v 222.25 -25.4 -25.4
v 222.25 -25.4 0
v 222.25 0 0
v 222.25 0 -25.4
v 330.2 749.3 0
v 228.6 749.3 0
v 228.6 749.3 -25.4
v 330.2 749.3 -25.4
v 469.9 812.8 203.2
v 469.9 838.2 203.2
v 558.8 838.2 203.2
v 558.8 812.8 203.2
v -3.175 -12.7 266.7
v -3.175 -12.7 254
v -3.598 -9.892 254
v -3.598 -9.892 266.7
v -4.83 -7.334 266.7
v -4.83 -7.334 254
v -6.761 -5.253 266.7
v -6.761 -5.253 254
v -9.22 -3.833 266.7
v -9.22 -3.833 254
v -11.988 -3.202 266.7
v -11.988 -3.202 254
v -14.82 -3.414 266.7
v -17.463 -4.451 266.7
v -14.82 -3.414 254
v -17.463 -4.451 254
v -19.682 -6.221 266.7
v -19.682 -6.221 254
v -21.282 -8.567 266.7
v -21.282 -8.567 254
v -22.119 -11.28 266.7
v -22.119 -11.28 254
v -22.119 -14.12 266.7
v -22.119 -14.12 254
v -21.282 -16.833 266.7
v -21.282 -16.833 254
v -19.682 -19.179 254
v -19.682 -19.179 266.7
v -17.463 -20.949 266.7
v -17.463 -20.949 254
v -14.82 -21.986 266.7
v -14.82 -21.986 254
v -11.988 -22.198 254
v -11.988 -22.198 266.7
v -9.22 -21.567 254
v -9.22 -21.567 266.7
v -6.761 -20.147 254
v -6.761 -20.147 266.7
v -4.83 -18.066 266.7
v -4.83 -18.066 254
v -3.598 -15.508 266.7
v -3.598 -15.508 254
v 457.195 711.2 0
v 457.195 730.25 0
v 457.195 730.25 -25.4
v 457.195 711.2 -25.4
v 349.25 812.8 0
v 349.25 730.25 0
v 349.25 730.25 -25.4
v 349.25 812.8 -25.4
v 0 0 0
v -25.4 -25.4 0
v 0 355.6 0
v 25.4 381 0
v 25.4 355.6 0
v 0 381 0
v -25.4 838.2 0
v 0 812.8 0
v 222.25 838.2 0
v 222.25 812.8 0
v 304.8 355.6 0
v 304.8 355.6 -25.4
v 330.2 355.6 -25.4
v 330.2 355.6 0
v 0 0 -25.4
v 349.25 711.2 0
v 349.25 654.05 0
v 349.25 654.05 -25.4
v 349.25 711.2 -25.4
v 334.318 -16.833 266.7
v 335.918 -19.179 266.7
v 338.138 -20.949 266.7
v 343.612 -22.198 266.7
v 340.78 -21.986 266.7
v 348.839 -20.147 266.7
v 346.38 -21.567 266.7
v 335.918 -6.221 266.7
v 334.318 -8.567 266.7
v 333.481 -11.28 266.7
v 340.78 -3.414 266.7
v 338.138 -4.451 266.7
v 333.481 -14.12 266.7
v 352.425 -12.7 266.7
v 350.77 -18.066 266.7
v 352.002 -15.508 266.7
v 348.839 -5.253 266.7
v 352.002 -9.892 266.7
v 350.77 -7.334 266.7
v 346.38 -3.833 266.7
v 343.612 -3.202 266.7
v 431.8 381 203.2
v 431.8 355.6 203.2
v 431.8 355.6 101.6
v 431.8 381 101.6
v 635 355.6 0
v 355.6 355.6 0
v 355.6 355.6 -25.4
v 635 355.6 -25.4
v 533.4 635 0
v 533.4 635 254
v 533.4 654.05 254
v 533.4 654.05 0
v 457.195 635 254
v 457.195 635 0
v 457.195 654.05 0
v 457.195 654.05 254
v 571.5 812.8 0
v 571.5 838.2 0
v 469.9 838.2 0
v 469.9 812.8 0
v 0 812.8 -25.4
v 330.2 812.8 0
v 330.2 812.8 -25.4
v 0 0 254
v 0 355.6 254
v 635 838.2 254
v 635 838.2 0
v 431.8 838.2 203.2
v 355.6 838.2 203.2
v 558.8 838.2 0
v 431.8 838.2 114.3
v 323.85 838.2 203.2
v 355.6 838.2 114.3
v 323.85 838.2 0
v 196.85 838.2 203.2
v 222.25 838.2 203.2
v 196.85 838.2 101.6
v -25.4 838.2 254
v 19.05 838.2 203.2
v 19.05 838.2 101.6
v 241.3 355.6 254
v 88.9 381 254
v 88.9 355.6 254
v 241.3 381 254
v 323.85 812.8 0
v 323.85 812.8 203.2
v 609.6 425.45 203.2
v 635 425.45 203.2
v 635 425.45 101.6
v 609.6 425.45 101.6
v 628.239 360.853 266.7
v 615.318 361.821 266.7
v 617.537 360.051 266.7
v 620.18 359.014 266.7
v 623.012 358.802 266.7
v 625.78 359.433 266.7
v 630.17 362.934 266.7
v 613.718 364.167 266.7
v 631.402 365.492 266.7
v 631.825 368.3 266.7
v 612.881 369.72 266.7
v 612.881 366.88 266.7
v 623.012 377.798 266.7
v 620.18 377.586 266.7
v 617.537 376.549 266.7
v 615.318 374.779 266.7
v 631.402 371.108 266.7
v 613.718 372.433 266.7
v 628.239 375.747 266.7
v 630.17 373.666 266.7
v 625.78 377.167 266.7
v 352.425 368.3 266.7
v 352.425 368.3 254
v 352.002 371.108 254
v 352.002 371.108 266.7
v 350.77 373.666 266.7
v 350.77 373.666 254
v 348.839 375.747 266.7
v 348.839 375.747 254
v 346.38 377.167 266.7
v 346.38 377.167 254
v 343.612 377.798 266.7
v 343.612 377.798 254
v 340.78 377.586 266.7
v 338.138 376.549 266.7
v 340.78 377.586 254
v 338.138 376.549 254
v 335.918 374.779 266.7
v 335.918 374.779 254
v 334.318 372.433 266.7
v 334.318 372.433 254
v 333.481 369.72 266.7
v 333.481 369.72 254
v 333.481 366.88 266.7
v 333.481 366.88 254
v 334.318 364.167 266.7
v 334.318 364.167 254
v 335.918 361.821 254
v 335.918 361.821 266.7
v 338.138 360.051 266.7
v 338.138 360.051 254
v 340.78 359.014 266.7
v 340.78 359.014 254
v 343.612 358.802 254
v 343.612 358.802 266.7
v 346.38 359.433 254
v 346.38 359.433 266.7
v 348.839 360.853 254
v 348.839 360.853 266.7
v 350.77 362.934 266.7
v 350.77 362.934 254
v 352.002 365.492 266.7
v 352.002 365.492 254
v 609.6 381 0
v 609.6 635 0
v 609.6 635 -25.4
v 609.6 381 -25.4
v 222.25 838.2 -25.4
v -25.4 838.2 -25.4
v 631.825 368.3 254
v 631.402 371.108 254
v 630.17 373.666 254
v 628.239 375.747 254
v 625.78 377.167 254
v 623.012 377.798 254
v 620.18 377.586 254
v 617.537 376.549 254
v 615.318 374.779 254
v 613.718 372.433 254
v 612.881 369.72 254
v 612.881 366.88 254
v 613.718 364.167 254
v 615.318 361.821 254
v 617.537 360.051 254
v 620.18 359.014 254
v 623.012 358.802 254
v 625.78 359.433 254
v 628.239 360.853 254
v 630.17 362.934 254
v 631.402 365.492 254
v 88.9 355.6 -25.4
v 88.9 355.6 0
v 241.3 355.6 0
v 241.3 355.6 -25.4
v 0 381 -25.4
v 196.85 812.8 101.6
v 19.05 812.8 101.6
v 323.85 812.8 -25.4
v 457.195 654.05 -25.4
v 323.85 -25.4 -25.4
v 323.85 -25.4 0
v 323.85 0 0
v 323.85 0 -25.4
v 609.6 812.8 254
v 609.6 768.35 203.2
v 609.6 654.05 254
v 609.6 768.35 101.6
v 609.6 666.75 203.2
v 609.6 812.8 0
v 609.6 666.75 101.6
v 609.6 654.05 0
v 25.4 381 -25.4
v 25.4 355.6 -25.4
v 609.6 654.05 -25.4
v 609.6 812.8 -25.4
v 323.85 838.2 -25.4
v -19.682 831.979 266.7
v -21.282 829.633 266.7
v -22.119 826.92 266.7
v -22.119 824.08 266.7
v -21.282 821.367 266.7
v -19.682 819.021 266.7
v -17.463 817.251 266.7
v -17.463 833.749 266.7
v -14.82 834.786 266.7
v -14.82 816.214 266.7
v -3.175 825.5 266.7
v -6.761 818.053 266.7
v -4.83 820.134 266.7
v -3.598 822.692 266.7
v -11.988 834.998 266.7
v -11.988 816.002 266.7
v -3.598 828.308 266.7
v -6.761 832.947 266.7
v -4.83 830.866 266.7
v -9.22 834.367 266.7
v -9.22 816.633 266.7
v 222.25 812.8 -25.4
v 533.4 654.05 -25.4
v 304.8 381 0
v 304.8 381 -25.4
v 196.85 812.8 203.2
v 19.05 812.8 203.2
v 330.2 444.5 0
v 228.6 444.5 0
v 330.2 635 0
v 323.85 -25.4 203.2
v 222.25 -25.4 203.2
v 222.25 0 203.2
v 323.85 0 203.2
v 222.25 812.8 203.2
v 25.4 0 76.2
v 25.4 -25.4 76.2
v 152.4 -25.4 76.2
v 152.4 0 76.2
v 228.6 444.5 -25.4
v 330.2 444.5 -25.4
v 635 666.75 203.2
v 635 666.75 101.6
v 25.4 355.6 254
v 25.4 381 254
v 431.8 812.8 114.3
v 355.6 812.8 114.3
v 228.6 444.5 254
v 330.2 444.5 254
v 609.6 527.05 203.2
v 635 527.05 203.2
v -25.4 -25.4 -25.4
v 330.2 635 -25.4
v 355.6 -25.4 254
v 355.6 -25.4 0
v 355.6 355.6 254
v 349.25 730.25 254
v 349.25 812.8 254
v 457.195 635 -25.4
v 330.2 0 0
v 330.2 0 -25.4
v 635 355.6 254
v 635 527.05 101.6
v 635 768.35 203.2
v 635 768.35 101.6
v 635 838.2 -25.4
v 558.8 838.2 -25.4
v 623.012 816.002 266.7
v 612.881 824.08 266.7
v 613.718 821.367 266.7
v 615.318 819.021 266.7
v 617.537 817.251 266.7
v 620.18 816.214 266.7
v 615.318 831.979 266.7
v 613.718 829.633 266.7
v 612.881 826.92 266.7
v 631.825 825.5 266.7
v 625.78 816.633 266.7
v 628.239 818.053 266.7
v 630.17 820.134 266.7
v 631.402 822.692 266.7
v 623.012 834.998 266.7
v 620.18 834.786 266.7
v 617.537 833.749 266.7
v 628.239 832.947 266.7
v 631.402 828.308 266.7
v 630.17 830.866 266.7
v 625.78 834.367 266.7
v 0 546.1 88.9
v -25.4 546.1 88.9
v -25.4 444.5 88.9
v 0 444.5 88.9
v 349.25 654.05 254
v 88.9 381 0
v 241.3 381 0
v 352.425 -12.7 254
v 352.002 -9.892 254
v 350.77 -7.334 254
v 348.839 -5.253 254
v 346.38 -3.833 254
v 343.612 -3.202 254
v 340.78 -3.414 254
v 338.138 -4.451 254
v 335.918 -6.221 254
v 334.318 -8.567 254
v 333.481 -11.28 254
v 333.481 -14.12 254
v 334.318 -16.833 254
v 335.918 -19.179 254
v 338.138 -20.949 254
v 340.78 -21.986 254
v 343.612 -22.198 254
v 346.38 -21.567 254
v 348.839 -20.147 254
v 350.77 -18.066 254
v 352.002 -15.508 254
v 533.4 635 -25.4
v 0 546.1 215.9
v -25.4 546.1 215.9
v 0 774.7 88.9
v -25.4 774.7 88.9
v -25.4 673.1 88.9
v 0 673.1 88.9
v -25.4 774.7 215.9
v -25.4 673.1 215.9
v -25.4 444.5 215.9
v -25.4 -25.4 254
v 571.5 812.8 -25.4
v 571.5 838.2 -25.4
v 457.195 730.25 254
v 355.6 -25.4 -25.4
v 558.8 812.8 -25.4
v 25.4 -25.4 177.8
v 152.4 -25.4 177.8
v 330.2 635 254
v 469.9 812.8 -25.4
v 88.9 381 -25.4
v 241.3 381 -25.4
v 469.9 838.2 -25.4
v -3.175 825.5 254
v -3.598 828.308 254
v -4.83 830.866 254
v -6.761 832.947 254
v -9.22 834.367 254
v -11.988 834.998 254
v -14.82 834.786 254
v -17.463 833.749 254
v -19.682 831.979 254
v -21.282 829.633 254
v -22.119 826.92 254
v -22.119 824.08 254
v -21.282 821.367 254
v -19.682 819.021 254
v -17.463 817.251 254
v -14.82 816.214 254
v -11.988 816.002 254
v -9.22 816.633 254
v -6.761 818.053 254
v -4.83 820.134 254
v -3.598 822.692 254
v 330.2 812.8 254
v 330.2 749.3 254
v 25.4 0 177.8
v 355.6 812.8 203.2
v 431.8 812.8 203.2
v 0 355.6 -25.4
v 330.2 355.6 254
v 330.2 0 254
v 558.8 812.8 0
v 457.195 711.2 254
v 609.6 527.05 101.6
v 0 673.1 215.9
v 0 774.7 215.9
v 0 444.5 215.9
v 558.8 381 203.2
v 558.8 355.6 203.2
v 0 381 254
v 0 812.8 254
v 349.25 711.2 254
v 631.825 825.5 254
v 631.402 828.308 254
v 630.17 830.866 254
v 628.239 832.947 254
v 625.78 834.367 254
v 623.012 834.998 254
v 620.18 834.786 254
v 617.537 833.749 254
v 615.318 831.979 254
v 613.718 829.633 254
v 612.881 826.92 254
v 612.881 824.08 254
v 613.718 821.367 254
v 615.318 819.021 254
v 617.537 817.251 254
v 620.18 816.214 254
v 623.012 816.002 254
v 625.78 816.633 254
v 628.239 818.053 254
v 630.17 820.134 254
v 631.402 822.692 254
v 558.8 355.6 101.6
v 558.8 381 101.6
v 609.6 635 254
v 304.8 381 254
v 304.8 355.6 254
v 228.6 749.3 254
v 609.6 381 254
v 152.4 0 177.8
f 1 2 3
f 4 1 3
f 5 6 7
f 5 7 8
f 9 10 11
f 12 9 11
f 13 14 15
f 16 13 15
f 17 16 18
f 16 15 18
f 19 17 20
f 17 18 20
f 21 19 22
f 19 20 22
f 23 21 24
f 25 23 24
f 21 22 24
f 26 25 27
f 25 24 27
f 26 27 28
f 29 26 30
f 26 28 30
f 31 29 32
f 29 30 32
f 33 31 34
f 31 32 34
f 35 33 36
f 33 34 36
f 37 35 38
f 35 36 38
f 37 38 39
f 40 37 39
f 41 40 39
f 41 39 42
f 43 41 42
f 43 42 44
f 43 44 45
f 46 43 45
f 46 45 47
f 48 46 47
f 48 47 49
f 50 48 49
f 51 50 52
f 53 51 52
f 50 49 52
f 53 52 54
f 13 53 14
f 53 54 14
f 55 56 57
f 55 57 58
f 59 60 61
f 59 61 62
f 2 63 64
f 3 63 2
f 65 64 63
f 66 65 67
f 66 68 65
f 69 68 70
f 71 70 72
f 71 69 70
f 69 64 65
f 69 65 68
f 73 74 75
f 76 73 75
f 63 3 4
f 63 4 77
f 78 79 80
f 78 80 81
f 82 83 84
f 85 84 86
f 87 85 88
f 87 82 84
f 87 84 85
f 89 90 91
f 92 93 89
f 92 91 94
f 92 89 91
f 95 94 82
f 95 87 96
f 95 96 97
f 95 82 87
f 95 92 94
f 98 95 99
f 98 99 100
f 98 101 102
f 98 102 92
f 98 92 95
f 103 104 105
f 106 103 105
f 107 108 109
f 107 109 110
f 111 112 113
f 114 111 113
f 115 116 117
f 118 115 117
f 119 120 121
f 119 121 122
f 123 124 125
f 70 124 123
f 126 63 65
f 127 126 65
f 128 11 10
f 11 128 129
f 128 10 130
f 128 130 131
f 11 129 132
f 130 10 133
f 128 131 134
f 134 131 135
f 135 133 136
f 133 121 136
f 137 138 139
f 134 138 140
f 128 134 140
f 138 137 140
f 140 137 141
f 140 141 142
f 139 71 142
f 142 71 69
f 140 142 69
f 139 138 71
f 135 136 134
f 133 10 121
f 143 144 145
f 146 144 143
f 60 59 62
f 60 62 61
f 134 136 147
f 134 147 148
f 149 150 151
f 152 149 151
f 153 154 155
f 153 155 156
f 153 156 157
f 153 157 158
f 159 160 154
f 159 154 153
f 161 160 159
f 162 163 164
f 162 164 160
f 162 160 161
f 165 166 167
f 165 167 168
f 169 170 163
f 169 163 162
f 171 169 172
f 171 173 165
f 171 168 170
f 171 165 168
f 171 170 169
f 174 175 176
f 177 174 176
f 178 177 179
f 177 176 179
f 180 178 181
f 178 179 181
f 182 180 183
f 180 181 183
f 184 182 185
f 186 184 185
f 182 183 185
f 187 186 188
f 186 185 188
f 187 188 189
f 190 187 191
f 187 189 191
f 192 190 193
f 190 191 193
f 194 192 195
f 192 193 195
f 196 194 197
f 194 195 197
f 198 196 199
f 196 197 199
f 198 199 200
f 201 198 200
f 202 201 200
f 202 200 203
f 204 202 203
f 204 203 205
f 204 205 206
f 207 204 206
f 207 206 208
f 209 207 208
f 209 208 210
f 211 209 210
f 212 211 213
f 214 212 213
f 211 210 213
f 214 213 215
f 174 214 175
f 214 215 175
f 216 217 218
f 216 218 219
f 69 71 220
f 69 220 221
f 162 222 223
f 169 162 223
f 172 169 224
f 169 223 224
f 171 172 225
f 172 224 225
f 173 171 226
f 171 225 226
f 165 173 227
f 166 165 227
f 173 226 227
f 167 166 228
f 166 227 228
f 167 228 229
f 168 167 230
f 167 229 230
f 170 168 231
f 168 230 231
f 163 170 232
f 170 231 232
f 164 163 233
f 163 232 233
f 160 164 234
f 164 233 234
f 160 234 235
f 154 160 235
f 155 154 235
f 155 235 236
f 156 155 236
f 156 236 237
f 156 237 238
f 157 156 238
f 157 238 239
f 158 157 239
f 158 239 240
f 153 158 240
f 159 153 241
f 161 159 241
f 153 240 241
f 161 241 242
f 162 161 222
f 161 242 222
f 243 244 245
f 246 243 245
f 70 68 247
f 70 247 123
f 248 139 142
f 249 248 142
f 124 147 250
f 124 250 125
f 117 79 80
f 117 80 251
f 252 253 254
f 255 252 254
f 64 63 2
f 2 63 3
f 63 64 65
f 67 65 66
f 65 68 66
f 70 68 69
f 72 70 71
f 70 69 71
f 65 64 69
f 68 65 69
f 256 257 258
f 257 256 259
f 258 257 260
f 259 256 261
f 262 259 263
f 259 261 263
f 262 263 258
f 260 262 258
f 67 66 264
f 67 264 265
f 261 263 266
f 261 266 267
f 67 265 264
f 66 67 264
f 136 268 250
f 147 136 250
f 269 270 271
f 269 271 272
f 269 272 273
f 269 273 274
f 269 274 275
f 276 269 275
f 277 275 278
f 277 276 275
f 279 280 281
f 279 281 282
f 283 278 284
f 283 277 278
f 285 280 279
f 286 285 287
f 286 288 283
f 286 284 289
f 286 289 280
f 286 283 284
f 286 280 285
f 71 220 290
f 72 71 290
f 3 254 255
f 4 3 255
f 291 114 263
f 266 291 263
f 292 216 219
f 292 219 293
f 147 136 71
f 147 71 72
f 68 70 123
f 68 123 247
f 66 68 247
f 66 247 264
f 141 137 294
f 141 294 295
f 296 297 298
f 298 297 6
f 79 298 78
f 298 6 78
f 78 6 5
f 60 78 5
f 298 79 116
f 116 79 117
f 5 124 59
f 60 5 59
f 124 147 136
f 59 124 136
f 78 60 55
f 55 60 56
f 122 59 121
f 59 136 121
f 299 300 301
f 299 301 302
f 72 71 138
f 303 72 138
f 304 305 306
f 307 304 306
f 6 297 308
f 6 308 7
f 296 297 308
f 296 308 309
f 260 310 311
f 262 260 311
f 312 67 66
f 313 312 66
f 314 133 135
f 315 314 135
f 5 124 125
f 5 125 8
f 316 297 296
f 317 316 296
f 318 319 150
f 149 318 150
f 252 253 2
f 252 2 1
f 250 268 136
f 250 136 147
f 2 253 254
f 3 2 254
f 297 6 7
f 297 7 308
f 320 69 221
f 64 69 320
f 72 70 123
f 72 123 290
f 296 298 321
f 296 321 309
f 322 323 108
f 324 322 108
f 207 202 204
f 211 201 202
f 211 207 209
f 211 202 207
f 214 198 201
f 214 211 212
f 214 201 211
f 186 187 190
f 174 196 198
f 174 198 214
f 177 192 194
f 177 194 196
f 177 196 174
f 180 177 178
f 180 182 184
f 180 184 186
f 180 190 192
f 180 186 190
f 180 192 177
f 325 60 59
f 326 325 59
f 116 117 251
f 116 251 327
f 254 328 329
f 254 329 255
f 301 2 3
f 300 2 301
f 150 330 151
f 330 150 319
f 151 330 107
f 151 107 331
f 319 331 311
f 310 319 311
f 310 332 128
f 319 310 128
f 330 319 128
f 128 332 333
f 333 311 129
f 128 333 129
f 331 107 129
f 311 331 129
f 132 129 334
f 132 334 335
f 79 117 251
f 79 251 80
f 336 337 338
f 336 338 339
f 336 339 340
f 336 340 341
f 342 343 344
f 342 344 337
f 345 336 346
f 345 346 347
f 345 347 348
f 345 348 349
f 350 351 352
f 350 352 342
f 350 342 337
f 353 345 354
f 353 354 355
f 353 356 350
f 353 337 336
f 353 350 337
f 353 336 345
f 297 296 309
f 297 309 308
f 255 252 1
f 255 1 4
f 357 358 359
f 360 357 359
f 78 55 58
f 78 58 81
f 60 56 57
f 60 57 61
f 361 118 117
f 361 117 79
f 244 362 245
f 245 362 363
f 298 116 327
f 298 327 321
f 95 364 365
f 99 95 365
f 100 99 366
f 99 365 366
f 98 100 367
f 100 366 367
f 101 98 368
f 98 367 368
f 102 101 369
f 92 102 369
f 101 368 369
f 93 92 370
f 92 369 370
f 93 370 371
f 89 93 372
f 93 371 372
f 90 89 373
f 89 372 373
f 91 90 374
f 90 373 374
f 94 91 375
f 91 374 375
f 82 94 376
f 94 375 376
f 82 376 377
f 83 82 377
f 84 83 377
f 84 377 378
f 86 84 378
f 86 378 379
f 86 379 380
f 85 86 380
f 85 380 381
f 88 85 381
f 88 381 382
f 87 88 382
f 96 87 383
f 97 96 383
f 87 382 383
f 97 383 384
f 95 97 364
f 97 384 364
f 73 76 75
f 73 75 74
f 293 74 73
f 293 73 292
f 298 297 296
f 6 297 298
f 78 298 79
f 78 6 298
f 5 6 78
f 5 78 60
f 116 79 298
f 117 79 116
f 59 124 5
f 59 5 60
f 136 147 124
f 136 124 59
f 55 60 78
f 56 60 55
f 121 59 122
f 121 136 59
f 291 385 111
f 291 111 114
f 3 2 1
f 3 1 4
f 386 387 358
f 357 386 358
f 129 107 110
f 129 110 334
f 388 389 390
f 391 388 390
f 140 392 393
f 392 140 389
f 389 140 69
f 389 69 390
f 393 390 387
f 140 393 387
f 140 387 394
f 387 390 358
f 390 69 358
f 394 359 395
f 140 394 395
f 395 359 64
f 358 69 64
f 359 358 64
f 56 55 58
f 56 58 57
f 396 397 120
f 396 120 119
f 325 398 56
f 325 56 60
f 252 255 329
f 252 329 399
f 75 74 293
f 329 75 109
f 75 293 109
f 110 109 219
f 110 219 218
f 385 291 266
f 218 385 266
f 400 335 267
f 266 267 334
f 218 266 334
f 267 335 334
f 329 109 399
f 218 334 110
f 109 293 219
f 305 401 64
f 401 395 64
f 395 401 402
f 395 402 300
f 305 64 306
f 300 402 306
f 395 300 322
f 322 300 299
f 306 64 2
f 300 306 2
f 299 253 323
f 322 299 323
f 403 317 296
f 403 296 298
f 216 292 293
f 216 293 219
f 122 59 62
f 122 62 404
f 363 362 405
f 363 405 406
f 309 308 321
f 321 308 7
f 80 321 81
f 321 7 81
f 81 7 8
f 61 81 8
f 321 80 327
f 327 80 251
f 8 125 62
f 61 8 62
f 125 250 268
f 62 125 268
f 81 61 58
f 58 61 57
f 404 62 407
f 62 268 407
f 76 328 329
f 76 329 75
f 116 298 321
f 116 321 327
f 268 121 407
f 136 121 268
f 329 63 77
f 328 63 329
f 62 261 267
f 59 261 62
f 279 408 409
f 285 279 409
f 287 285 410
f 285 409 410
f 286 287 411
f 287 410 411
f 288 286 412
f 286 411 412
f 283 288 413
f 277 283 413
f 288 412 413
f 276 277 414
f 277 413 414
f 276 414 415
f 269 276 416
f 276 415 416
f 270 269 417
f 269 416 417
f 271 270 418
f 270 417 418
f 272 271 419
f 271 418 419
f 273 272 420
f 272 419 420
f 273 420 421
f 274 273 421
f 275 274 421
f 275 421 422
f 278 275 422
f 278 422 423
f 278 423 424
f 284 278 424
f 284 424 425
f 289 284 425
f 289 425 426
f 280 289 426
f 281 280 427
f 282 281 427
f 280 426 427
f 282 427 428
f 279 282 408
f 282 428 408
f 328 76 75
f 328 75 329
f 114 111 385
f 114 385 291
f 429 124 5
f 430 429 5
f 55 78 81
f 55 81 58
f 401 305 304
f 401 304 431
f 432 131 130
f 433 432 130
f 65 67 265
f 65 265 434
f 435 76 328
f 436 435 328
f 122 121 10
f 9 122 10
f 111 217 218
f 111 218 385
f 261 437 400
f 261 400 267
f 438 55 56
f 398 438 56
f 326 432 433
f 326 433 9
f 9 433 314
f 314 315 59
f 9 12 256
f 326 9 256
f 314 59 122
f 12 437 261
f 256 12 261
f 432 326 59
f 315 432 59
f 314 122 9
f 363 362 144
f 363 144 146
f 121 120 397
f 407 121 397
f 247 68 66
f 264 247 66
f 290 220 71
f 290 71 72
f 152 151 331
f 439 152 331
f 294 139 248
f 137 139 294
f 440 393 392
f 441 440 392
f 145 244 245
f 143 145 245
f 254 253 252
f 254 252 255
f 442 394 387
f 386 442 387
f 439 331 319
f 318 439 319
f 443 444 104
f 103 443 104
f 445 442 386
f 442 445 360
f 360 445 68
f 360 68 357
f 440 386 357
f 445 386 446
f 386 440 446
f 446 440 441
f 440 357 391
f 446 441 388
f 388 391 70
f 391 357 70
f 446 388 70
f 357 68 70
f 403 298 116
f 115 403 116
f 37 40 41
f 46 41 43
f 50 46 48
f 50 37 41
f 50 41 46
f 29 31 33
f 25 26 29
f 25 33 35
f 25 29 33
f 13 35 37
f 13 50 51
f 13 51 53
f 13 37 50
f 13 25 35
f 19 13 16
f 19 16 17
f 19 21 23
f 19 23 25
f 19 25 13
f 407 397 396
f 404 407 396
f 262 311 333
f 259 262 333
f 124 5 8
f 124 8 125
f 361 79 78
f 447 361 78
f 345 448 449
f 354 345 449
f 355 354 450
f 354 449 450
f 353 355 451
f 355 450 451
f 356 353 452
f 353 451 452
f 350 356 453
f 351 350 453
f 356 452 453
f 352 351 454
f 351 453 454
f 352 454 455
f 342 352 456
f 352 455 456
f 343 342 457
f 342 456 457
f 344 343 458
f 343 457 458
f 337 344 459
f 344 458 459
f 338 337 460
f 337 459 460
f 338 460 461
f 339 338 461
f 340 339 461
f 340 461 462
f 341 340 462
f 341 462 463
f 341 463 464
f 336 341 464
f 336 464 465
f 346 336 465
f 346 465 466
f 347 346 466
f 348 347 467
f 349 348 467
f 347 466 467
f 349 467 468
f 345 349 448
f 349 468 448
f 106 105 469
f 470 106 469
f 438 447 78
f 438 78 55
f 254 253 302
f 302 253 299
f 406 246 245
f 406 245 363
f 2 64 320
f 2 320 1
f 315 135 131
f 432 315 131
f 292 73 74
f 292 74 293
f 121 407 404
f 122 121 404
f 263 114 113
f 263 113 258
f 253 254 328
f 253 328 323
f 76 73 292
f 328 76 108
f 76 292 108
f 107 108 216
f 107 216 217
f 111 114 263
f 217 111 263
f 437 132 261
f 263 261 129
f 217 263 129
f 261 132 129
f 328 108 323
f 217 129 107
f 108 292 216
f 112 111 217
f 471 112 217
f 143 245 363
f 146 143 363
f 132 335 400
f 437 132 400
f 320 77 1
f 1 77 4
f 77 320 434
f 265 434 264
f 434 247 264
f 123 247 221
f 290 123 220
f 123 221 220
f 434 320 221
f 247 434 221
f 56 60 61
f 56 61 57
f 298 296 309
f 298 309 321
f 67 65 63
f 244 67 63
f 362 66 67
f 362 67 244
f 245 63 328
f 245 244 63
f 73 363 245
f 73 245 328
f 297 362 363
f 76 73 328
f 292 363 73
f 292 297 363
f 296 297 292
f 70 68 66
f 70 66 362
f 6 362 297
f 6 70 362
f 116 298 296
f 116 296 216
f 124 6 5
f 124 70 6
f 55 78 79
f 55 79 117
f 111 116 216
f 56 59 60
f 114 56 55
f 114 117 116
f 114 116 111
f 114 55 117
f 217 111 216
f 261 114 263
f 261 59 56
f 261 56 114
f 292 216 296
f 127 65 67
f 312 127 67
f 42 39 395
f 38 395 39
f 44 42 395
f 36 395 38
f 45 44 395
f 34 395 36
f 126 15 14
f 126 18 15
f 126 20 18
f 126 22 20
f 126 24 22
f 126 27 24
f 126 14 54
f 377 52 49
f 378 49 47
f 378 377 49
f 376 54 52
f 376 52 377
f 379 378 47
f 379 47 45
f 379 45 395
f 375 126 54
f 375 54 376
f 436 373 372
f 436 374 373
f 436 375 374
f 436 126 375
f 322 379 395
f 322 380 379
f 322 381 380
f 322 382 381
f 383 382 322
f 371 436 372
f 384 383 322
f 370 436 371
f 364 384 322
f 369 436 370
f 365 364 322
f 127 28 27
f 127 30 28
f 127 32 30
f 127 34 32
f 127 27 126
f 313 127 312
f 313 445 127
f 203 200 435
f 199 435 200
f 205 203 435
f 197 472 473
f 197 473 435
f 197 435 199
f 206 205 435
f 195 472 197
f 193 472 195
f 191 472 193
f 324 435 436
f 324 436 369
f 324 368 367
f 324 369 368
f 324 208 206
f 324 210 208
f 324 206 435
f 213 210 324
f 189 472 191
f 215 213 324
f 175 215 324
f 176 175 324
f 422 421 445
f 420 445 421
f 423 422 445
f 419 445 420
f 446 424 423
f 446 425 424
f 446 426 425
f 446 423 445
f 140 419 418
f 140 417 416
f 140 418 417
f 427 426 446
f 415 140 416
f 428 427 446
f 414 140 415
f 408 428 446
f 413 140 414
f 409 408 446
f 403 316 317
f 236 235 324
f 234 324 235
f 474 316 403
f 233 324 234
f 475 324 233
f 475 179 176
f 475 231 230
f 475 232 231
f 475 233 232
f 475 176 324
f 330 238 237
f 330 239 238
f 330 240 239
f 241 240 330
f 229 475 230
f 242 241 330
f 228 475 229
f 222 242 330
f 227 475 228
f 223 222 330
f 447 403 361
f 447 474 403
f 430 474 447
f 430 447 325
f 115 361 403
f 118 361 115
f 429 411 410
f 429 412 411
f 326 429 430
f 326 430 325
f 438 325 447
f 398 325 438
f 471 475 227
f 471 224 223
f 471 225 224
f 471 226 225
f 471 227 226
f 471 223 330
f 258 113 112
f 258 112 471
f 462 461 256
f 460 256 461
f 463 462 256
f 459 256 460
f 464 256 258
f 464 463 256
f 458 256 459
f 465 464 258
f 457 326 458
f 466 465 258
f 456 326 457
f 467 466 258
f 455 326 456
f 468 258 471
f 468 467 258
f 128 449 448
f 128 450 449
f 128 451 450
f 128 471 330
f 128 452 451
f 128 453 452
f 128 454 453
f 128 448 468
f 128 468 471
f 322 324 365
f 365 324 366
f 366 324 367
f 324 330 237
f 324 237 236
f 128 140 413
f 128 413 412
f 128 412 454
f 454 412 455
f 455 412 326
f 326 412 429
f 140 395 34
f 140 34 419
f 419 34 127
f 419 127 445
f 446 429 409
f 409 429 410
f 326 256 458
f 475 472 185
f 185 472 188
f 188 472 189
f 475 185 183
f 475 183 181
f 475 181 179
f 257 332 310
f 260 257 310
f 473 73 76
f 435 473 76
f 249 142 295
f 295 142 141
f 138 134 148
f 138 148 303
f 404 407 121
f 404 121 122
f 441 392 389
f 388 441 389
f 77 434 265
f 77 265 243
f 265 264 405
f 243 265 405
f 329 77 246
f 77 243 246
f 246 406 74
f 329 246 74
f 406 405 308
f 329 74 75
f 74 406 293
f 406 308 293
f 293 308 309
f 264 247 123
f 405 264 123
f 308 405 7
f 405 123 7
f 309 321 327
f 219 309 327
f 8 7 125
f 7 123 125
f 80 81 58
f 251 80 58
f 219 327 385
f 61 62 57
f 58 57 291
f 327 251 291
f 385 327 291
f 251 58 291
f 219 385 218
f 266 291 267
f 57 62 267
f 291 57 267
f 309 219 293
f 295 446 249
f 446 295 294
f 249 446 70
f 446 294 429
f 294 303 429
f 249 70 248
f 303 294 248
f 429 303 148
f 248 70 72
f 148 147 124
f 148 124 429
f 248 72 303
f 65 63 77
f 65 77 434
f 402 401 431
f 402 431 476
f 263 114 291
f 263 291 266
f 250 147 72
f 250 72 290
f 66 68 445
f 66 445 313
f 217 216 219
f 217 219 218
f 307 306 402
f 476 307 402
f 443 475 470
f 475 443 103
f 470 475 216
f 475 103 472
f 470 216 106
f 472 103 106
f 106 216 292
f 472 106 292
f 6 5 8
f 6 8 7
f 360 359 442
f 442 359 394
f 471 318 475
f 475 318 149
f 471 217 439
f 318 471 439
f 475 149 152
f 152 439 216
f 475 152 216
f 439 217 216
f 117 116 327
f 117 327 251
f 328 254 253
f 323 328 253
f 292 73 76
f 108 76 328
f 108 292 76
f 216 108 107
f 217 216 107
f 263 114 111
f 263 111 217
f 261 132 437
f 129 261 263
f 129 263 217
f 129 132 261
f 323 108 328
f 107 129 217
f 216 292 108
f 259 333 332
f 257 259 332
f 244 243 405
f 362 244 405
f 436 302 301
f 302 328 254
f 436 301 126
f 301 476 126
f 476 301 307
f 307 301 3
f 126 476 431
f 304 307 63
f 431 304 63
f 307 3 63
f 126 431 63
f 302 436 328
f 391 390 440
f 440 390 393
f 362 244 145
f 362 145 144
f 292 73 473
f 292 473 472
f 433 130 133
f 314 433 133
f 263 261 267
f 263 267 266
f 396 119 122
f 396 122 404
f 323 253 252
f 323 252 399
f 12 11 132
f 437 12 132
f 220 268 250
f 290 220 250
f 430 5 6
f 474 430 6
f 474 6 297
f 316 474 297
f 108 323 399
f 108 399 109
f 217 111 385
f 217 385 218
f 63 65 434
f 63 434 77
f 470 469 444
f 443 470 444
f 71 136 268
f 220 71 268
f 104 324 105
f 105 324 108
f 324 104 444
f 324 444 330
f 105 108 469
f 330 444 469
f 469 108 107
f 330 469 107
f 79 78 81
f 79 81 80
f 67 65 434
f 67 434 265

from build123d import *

# Parameters (mm, degrees)
F0_W      = 25.4
F0_H      = 25.4
F0_W_2    = 76.2
F0_H_2    = 19.05
F1_DEPTH  = 254
F0_W_3    = 152.4
F2_DEPTH  = 25.4
F3_R      = 9.525
F4_DEPTH  = 12.7
F5_W      = 127
F5_H      = 101.6
F6_DEPTH  = 25.4
F7_W      = 101.6
F7_H      = 203.2
F8_DEPTH  = 25.4
F10_DEPTH = 25.4
F12_DEPTH = 25.4
F13_DEPTH = 25.4
F15_DEPTH = 25.4
F16_DEPTH = 25.4
F17_W     = 101.6
F17_H     = 203.2
F17_W_2   = 177.8
F17_H_2   = 101.6
F18_DEPTH = 25.4
F19_DEPTH = 25.4
F21_DEPTH = 25.4
F22_DEPTH = 25.4
F23_DEPTH = 25.4
F24_DEPTH = 101.6
F25_DEPTH = 101.6


with BuildPart() as f1:
    # F0 (on Top) → F1 (new body)
    with BuildSketch(Plane.XY):
        Polygon((355.6, -25.4), (355.6, 0), (355.6, 355.6), (635, 355.6), (635, 838.2), (-25.4, 838.2), (-25.4, -25.4), align=None)
        Polygon((330.2, 0), (0, 0), (0, 355.6), (0, 381), (0, 812.8), (330.2, 812.8), (349.25, 812.8), (508, 812.8), (609.6, 812.8), (609.6, 654.05), (609.6, 635), (609.6, 381), (330.2, 381), (330.2, 355.6), align=None, mode=Mode.SUBTRACT)
        with Locations((12.7, 368.3)):
            Rectangle(F0_W, F0_H)
        with Locations((317.5, 368.3)):
            Rectangle(F0_W, F0_H)
        Polygon((330.2, 711.2), (330.2, 749.3), (228.6, 749.3), (228.6, 444.5), (330.2, 444.5), (330.2, 635), (330.2, 672.4181091309), align=None)
        Polygon((349.25, 812.8), (330.2, 812.8), (330.2, 749.3), (330.2, 711.2), (349.25, 711.2), (457.1951833257, 711.2), (457.1951833257, 730.25), (349.25, 730.25), align=None)
        Polygon((349.25, 711.2), (330.2, 711.2), (330.2, 672.4181091309), (330.2, 635), (457.1951833257, 635), (457.1951833257, 654.05), (349.25, 654.05), align=None)
        with Locations((571.5, 644.525)):
            Rectangle(F0_W_2, F0_H_2)
    extrude(amount=F1_DEPTH)

    # F3 (on face) → F4 (join)
    with BuildSketch(Plane.XY.offset(254)):
        with Locations((-12.7, -12.7)):
            Circle(F3_R)
        with Locations((342.9, -12.7)):
            Circle(F3_R)
        with Locations((342.9, 368.3)):
            Circle(F3_R)
        with Locations((622.3, 368.3)):
            Circle(F3_R)
        with Locations((622.3, 825.5)):
            Circle(F3_R)
        with Locations((-12.7, 825.5)):
            Circle(F3_R)
    extrude(amount=F4_DEPTH)

    # F5 (on face) → F6 (cut)
    with BuildSketch(Plane.XZ.offset(25.4)):
        with Locations((88.9, 127)):
            Rectangle(F5_W, F5_H)
    extrude(amount=-F6_DEPTH, mode=Mode.SUBTRACT)

    # F7 (on face) → F8 (cut)
    with BuildSketch(Plane.XZ.offset(25.4)):
        with Locations((273.05, 101.6)):
            Rectangle(F7_W, F7_H)
    extrude(amount=-F8_DEPTH, mode=Mode.SUBTRACT)

    # F9 (on face) → F10 (cut)
    with BuildSketch(Plane.XZ.offset(-355.6)):
        Polygon((431.8, 101.6), (495.3, 101.6), (558.8, 101.6), (558.8, 203.2), (431.8, 203.2), align=None)
    extrude(amount=-F10_DEPTH, mode=Mode.SUBTRACT)

    # F11 (on face) → F12 (cut)
    with BuildSketch(Plane.YZ.offset(635)):
        Polygon((527.05, 203.2), (476.25, 203.2), (425.45, 203.2), (425.45, 101.6), (527.05, 101.6), align=None)
        Polygon((768.35, 203.2), (717.55, 203.2), (666.75, 203.2), (666.75, 101.6), (768.35, 101.6), align=None)
    extrude(amount=-F12_DEPTH, mode=Mode.SUBTRACT)

    # F11 (on face) → F13 (cut)
    with BuildSketch(Plane.YZ.offset(635)):
        Polygon((527.05, 203.2), (476.25, 203.2), (425.45, 203.2), (425.45, 101.6), (527.05, 101.6), align=None)
        Polygon((768.35, 203.2), (717.55, 203.2), (666.75, 203.2), (666.75, 101.6), (768.35, 101.6), align=None)
    extrude(amount=-F13_DEPTH, mode=Mode.SUBTRACT)

    # F14 (on face) → F15 (cut)
    with BuildSketch(Plane(origin=(-25.4, 0, 0), x_dir=(0, -1, 0), z_dir=(-1, 0, 0))):
        Polygon((-673.1, 215.9), (-723.9, 215.9), (-774.7, 215.9), (-774.7, 88.9), (-673.1, 88.9), align=None)
        Polygon((-546.1, 215.9), (-546.1, 88.9), (-444.5, 88.9), (-444.5, 215.9), (-495.3, 215.9), align=None)
    extrude(amount=-F15_DEPTH, mode=Mode.SUBTRACT)

    # F14 (on face) → F16 (cut)
    with BuildSketch(Plane(origin=(-25.4, 0, 0), x_dir=(0, -1, 0), z_dir=(-1, 0, 0))):
        Polygon((-673.1, 215.9), (-723.9, 215.9), (-774.7, 215.9), (-774.7, 88.9), (-673.1, 88.9), align=None)
        Polygon((-546.1, 215.9), (-546.1, 88.9), (-444.5, 88.9), (-444.5, 215.9), (-495.3, 215.9), align=None)
    extrude(amount=-F16_DEPTH, mode=Mode.SUBTRACT)

    # F17 (on face) → F18 (cut)
    with BuildSketch(Plane(origin=(0, 838.2, 0), x_dir=(-1, 0, 0), z_dir=(0, 1, 0))):
        with Locations((-273.05, 101.6)):
            Rectangle(F17_W, F17_H)
        with Locations((-107.95, 152.4)):
            Rectangle(F17_W_2, F17_H_2)
    extrude(amount=-F18_DEPTH, mode=Mode.SUBTRACT)

    # F17 (on face) → F19 (cut)
    with BuildSketch(Plane(origin=(0, 838.2, 0), x_dir=(-1, 0, 0), z_dir=(0, 1, 0))):
        with Locations((-273.05, 101.6)):
            Rectangle(F17_W, F17_H)
        with Locations((-107.95, 152.4)):
            Rectangle(F17_W_2, F17_H_2)
    extrude(amount=-F19_DEPTH, mode=Mode.SUBTRACT)

    # F20 (on face) → F21 (cut)
    with BuildSketch(Plane(origin=(0, 838.2, 0), x_dir=(-1, 0, 0), z_dir=(0, 1, 0))):
        Polygon((-431.8, 203.2), (-431.8, 114.3), (-355.6, 114.3), (-355.6, 139.7), (-355.6, 203.2), align=None)
    extrude(amount=-F21_DEPTH, mode=Mode.SUBTRACT)

    # F20 (on face) → F22 (cut)
    with BuildSketch(Plane(origin=(0, 838.2, 0), x_dir=(-1, 0, 0), z_dir=(0, 1, 0))):
        Polygon((-355.6, 114.3), (-355.6, 139.7), (-355.6, 203.2), (-431.8, 203.2), (-431.8, 114.3), align=None)
        Polygon((-469.9, 0), (-469.9, 114.3), (-469.9, 203.2), (-558.8, 203.2), (-558.8, 0), align=None)
    extrude(amount=-F22_DEPTH, mode=Mode.SUBTRACT)


with BuildPart() as f1b:
    # F0 (on Top) → F1, piece 2 (new body)
    with BuildSketch(Plane.XY):
        with Locations((165.1, 368.3)):
            Rectangle(F0_W_3, F0_H)
    extrude(amount=F1_DEPTH)


with BuildPart() as f2:
    # F0 (on Top) → F2 (new body)
    with BuildSketch(Plane.XY):
        Polygon((0, 355.6), (0, 0), (330.2, 0), (330.2, 355.6), (304.8, 355.6), (304.8, 381), (330.2, 381), (609.6, 381), (609.6, 635), (533.4, 635), (533.4, 654.05), (609.6, 654.05), (609.6, 812.8), (508, 812.8), (349.25, 812.8), (349.25, 730.25), (457.1951833257, 730.25), (457.1951833257, 711.2), (349.25, 711.2), (349.25, 654.05), (457.1951833257, 654.05), (457.1951833257, 635), (330.2, 635), (330.2, 444.5), (228.6, 444.5), (228.6, 749.3), (330.2, 749.3), (330.2, 812.8), (0, 812.8), (0, 381), (25.4, 381), (25.4, 355.6), align=None)
        with Locations((165.1, 368.3)):
            Rectangle(F0_W_3, F0_H, mode=Mode.SUBTRACT)
    extrude(amount=-F2_DEPTH)


with BuildPart() as f23:
    # F23 (new): a face of the model
    f23_faces = [f1.part.faces().sort_by_distance(p)[0] for p in [
        (306.6509224032, 635.5643745872, 0),
    ]]
    extrude(f23_faces, amount=F23_DEPTH)


with BuildPart() as f23b:
    # F23#2 (new): a face of the model
    f23_2_faces = [f1.part.faces().sort_by_distance(p)[0] for p in [
        (625.7542604406, 596.9, 0),
    ]]
    extrude(f23_2_faces, amount=F23_DEPTH)


with BuildPart() as f23c:
    # F23#3 (new): a face of the model
    f23_3_faces = [f1.part.faces().sort_by_distance(p)[0] for p in [
        (98.425, 829.2159280808, 0),
    ]]
    extrude(f23_3_faces, amount=F23_DEPTH)


with BuildPart() as f24:
    # F24 (new): a face of the model
    f24_faces = [f23c.part.faces().sort_by_distance(p)[0] for p in [
        (222.25, -12.7, -12.7),
    ]]
    extrude(f24_faces, amount=F24_DEPTH)


with BuildPart() as f25:
    # F25 (new): a face of the model
    f25_faces = [f23c.part.faces().sort_by_distance(p)[0] for p in [
        (222.25, 825.5, -12.7),
    ]]
    extrude(f25_faces, amount=F25_DEPTH)


with BuildPart() as f25b:
    # F25#2 (new): a face of the model
    f25_2_faces = [f23.part.faces().sort_by_distance(p)[0] for p in [
        (469.9, 825.5, -12.7),
    ]]
    extrude(f25_2_faces, amount=F25_DEPTH)


solid = Compound([f1.part, f1b.part, f2.part, f23.part, f23b.part, f23c.part, f24.part, f25.part, f25b.part])
